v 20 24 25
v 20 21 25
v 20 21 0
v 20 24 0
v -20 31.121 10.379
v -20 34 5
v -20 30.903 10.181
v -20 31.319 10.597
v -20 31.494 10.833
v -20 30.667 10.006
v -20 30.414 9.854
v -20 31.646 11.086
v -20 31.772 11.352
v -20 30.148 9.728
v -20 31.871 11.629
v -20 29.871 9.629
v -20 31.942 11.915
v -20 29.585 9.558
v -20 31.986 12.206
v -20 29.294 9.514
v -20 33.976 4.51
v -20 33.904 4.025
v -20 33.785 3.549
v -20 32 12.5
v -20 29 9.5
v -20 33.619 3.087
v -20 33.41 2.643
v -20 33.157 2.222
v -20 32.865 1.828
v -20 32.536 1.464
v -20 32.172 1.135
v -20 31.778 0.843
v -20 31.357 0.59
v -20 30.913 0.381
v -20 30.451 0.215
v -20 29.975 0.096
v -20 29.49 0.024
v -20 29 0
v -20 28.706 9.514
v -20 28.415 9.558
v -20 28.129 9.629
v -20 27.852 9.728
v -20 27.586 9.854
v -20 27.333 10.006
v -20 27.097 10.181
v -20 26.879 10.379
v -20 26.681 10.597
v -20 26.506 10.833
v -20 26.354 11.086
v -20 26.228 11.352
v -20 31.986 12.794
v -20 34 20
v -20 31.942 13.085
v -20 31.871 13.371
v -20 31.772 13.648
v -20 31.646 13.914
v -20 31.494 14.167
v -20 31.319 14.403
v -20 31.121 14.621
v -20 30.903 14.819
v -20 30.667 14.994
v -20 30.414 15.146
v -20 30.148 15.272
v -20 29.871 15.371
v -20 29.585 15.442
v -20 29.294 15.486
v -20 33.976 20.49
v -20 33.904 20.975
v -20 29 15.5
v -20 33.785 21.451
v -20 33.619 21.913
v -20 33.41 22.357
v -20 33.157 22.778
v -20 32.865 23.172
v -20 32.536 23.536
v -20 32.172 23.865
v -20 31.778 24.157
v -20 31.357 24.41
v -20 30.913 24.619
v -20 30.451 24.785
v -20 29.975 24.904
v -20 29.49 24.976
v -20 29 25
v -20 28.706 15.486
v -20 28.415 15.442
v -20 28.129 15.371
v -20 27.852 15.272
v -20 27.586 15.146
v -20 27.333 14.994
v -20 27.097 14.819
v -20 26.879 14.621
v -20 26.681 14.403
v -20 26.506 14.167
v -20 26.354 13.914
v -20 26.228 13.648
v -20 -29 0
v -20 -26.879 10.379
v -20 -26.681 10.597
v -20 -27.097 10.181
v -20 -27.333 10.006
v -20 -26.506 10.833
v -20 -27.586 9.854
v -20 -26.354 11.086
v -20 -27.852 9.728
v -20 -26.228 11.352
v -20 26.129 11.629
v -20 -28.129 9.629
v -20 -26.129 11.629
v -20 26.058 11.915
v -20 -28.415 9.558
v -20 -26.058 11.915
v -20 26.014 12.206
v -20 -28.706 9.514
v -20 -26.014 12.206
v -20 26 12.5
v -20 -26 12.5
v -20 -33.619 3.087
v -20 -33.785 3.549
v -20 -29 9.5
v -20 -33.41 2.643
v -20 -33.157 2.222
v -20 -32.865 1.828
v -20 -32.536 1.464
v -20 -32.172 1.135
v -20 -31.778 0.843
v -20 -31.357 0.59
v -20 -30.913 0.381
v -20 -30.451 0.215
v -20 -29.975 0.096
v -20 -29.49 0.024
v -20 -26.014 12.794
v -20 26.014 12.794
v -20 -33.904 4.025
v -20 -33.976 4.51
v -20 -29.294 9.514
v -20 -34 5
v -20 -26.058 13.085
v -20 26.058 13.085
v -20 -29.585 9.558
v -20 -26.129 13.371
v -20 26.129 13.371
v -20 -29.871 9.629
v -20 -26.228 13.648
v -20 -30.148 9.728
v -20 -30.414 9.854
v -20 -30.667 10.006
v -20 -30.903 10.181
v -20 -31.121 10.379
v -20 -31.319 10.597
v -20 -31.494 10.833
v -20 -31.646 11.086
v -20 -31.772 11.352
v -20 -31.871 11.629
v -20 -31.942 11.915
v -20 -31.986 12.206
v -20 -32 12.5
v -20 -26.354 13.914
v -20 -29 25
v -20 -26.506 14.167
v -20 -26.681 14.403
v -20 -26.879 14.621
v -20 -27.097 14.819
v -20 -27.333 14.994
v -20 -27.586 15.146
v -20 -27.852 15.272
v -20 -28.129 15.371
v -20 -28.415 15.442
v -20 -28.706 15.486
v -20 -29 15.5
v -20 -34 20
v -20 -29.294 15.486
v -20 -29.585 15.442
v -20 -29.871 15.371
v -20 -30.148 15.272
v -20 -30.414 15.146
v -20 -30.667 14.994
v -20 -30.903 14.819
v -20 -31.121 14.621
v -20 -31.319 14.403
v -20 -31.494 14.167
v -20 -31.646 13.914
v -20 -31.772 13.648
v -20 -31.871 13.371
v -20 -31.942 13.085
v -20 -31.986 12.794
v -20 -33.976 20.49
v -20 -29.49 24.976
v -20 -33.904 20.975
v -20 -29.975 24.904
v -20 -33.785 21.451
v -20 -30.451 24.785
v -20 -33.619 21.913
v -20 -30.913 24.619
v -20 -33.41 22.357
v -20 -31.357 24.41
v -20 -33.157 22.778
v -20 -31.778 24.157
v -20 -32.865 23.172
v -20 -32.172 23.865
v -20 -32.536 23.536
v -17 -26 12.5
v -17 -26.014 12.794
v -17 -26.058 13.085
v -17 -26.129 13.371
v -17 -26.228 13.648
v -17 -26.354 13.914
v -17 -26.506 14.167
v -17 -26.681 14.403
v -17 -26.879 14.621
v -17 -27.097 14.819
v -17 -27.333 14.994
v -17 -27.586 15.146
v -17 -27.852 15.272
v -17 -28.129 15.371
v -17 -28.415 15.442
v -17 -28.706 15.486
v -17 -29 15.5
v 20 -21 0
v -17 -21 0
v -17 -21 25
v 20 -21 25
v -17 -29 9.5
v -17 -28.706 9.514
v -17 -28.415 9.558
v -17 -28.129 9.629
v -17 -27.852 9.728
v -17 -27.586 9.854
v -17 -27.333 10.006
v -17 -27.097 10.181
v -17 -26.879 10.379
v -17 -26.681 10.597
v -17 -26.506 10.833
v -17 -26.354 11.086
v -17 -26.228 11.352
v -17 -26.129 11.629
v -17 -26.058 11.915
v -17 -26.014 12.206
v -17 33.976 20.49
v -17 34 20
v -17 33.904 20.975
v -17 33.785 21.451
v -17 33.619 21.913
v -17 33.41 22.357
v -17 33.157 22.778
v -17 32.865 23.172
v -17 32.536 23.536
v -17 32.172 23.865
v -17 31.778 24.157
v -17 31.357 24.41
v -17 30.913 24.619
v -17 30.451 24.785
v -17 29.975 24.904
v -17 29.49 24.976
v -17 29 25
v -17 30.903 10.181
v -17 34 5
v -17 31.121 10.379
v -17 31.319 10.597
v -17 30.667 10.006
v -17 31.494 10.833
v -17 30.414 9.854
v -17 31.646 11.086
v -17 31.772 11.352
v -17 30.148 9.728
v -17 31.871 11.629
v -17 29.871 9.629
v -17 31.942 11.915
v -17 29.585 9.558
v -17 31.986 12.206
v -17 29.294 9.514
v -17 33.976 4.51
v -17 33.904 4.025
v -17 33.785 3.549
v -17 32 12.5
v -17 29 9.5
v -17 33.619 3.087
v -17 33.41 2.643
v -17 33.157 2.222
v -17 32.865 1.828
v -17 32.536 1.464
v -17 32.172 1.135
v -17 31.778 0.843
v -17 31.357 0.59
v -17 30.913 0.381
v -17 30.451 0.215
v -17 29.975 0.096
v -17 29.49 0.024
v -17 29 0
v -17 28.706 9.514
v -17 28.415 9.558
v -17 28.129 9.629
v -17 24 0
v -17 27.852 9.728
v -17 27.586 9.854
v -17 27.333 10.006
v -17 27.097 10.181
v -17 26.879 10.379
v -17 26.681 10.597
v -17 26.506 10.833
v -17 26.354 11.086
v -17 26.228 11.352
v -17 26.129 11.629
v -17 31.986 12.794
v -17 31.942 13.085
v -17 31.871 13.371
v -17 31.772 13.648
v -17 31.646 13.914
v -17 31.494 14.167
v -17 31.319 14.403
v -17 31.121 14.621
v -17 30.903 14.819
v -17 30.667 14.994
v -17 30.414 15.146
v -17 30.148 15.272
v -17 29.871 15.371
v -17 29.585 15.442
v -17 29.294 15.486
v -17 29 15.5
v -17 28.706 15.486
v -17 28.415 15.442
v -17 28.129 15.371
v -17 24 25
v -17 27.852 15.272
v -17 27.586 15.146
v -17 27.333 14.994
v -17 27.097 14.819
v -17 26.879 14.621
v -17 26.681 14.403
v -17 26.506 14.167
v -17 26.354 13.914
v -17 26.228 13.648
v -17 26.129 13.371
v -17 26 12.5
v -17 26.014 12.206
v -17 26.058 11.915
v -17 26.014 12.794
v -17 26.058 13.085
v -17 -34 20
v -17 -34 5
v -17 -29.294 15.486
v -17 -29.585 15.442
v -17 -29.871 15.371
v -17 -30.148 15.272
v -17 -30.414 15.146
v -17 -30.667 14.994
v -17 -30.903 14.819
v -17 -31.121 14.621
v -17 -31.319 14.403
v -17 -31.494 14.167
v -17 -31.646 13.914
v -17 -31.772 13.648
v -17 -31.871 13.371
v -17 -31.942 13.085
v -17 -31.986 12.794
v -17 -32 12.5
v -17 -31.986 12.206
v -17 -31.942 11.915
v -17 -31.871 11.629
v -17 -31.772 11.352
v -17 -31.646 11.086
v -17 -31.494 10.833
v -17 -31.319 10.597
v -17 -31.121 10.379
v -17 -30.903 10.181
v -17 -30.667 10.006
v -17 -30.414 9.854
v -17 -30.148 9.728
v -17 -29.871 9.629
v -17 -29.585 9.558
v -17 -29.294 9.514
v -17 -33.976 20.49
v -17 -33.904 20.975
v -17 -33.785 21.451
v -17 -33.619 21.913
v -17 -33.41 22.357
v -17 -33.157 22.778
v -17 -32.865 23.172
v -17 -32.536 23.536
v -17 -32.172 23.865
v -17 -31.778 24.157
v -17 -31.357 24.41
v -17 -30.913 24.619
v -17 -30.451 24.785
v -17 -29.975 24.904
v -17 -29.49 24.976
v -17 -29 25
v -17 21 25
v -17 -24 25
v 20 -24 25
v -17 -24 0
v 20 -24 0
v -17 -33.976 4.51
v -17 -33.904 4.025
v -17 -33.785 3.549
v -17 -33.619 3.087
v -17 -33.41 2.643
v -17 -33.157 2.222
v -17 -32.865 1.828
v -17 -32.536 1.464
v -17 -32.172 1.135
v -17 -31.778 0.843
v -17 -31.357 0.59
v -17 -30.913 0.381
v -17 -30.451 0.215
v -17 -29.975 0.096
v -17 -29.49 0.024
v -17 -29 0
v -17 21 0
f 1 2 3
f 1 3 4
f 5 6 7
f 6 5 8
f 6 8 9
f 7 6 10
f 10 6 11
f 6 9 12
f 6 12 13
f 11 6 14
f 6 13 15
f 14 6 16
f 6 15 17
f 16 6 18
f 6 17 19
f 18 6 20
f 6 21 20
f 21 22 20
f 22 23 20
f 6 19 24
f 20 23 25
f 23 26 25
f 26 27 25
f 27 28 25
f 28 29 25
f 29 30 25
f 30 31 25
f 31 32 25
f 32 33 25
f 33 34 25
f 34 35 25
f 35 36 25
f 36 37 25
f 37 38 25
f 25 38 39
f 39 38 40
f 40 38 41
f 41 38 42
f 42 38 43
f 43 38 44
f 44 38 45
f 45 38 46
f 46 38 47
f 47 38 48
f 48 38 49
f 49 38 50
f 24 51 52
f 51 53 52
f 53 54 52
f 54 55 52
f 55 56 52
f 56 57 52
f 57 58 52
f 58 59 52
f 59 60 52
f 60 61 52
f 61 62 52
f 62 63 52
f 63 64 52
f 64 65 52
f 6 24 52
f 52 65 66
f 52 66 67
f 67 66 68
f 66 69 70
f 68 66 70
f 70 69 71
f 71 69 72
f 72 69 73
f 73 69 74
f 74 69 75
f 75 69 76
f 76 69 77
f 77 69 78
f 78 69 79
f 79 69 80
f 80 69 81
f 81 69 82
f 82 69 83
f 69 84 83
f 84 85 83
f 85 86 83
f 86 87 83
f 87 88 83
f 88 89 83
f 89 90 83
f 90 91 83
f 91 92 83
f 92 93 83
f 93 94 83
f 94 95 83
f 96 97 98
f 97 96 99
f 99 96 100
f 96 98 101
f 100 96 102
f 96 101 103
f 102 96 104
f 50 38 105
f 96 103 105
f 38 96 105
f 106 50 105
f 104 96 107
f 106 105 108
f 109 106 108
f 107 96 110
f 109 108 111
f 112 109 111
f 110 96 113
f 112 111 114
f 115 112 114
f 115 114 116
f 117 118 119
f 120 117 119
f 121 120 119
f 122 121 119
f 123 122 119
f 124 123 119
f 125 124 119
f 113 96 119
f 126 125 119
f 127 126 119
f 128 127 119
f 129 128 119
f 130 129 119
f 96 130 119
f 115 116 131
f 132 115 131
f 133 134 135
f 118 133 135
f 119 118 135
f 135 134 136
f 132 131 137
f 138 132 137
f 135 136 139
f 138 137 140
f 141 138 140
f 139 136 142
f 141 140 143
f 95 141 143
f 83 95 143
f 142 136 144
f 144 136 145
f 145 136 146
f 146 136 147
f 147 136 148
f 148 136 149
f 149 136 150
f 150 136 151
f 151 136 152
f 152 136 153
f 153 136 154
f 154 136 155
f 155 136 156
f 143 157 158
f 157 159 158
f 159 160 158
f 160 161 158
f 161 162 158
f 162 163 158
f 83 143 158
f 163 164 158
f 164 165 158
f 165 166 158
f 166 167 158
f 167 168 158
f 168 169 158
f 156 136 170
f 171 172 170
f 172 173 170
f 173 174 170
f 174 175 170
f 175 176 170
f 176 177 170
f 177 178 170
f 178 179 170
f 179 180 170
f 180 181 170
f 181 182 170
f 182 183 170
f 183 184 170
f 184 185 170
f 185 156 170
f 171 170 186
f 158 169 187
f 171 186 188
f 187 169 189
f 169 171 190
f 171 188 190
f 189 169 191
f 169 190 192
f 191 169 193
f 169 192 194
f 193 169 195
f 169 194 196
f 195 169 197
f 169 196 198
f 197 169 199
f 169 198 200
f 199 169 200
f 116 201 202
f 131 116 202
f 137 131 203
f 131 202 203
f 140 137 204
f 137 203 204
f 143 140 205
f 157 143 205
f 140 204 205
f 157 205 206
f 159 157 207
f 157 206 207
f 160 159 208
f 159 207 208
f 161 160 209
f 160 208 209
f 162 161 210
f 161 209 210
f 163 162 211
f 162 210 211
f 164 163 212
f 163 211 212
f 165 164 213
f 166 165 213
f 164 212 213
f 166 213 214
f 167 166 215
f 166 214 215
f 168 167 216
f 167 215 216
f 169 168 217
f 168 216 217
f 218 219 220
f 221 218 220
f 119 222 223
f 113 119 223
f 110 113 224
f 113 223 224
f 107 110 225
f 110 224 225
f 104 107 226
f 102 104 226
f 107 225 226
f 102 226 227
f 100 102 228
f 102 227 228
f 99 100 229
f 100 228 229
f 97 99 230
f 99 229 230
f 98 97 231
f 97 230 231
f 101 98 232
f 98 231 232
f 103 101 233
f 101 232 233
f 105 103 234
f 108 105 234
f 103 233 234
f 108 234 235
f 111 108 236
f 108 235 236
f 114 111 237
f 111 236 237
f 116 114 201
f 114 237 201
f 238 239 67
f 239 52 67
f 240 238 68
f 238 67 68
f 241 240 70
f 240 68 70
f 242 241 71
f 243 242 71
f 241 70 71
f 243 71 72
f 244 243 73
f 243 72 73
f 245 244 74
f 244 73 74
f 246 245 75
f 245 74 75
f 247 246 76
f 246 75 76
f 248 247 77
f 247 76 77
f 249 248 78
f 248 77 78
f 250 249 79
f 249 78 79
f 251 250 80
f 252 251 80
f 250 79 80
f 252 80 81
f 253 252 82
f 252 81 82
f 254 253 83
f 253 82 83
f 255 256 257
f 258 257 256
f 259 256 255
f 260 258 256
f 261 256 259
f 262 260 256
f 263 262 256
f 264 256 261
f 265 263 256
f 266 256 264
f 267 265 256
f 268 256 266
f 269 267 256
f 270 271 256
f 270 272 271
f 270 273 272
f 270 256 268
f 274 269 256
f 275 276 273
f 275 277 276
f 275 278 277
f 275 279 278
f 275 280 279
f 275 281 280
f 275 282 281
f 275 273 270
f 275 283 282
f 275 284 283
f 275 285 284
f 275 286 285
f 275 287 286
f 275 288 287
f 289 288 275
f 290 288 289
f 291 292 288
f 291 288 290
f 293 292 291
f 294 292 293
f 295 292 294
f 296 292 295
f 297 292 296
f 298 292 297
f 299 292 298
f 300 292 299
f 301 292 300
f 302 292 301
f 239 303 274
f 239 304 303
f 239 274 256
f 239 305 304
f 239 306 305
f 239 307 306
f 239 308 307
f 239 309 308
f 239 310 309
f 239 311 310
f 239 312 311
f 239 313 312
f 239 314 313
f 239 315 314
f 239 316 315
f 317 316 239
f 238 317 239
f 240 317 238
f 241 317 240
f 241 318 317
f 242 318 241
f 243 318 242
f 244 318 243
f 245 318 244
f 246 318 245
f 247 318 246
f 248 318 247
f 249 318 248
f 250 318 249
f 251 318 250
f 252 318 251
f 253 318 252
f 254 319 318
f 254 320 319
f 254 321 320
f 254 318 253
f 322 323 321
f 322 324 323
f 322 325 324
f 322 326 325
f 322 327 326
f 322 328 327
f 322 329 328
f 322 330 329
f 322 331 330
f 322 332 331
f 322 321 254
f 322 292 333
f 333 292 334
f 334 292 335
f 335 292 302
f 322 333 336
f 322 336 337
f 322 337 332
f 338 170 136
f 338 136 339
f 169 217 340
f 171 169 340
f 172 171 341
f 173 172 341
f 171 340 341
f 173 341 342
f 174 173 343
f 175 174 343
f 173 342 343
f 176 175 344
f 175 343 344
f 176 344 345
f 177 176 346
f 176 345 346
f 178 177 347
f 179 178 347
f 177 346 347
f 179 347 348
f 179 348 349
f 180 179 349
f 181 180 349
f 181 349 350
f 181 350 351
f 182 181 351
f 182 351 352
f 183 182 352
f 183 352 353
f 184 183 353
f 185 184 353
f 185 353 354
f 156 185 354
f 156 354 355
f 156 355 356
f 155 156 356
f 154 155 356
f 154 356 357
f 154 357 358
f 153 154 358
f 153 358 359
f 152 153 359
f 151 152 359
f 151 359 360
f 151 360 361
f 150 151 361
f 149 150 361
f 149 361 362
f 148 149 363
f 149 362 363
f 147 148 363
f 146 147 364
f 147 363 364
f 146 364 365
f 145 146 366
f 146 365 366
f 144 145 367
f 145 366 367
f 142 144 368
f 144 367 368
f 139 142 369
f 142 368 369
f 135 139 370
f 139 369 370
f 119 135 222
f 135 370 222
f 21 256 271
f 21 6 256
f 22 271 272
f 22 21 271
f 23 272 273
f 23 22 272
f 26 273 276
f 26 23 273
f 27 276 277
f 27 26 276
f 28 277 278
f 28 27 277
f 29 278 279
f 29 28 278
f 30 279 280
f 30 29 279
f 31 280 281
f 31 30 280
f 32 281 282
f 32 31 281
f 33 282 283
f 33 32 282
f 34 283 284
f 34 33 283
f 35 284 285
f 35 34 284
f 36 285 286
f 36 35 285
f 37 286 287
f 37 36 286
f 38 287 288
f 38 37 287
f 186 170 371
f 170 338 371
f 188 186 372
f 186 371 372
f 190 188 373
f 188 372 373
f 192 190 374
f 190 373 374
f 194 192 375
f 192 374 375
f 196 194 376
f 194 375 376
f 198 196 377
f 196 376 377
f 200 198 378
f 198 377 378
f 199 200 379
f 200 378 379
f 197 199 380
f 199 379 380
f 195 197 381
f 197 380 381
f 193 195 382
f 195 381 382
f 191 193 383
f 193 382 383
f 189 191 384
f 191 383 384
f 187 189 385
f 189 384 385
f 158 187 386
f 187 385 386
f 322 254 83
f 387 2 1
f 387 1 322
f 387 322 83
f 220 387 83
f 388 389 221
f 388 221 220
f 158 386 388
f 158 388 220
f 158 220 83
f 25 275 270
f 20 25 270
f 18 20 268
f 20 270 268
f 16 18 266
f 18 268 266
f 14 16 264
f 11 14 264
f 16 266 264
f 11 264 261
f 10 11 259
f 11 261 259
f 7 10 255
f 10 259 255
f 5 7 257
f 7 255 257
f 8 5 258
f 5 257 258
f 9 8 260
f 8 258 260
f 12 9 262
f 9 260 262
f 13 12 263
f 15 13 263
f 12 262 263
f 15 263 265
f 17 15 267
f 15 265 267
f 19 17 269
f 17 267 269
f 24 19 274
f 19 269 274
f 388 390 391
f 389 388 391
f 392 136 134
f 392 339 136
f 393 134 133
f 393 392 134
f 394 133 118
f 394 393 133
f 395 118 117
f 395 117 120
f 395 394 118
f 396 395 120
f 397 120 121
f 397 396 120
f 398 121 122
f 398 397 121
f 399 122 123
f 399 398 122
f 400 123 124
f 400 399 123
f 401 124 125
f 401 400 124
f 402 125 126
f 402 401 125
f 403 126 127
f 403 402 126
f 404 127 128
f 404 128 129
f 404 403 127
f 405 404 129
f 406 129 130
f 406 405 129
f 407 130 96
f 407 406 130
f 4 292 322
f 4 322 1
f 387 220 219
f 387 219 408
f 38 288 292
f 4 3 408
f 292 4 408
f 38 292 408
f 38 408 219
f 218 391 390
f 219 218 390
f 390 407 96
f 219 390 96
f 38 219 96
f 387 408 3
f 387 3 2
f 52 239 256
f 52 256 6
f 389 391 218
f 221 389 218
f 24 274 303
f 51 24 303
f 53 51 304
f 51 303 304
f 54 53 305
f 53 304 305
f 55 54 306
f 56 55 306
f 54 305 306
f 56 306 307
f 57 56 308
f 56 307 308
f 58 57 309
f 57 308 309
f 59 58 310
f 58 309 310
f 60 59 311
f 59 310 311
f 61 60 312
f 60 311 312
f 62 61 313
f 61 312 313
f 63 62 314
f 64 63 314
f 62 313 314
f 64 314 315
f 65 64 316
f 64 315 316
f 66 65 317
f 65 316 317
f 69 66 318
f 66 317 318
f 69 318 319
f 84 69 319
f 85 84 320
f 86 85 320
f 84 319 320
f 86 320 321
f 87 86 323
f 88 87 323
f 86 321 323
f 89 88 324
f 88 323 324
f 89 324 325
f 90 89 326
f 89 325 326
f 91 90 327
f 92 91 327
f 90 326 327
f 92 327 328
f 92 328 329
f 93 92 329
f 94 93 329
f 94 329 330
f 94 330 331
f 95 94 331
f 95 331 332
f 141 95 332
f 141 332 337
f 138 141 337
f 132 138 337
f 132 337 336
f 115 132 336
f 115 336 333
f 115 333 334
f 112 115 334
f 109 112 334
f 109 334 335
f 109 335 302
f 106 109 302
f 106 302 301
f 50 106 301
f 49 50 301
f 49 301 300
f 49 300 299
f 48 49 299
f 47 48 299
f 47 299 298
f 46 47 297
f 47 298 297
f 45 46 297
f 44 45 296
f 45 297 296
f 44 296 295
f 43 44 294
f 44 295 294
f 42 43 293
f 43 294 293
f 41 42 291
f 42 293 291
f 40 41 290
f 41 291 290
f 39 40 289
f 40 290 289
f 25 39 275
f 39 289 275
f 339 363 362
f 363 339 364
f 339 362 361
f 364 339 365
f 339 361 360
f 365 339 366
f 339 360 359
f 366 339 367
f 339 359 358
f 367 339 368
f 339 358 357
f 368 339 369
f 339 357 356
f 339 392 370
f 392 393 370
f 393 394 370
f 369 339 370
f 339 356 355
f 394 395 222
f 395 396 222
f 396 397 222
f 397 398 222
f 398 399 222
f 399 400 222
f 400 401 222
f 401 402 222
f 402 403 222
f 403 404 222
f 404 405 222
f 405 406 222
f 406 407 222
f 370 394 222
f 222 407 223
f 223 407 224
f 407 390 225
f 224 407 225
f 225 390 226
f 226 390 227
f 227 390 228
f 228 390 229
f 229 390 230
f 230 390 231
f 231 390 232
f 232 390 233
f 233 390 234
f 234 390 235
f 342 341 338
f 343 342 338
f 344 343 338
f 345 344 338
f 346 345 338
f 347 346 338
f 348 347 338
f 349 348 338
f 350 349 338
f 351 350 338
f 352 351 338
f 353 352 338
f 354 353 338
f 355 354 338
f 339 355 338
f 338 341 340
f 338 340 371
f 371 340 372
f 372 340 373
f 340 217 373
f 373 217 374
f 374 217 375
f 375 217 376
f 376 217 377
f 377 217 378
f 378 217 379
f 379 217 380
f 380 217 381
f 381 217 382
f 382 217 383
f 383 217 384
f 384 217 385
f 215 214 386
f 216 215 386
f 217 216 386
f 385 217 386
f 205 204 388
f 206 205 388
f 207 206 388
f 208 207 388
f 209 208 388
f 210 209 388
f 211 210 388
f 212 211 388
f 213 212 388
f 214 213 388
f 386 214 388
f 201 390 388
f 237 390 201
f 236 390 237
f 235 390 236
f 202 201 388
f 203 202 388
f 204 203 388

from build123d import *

# Parameters (mm, degrees)
F0_W      = 40
F0_H      = 48
F1_DEPTH  = 25
F3_W      = 42
F3_H      = 25
F4_DEPTH  = 37
F2_W      = 3
F2_H      = 25
F5_DEPTH  = 10
F6_W      = 3
F6_H      = 25
F7_DEPTH  = 10
F8_R      = 5
F11_DEPTH = 25


with BuildPart() as f1:
    # F0 (on Top) → F1 (new body)
    with BuildSketch(Plane.XY):
        Rectangle(F0_W, F0_H)
    extrude(amount=F1_DEPTH)

    # F3 (on face) → F4 (cut)
    with BuildSketch(Plane.YZ.offset(20)):
        with Locations((0, 12.5)):
            Rectangle(F3_W, F3_H)
    extrude(amount=-F4_DEPTH, mode=Mode.SUBTRACT)

    # F2 (on face) → F5 (join)
    with BuildSketch(Plane.XZ.offset(24)):
        with Locations((-18.5, 12.5)):
            Rectangle(F2_W, F2_H)
    extrude(amount=F5_DEPTH)

    # F6 (on face) → F7 (join)
    with BuildSketch(Plane(origin=(0, 24, 0), x_dir=(-1, 0, 0), z_dir=(0, 1, 0))):
        with Locations((18.5, 12.5)):
            Rectangle(F6_W, F6_H)
    extrude(amount=F7_DEPTH)

    # F8
    f8_edges = [f1.edges().sort_by_distance(p)[0] for p in [
        (-18.5, 34, 0),
        (-18.5, 34, 25),
        (-18.5, -34, 0),
        (-18.5, -34, 25),
    ]]
    fillet(f8_edges, radius=F8_R)

    # F10 (on face) + F9 (on face) → F11 (cut)
    with BuildSketch(Plane.YZ.offset(-17)):
        with BuildLine():
            ThreePointArc((29, 15.5), (26, 12.5), (29, 9.5))
            Line((29, 9.5), (29, 15.5))
        make_face()
        with BuildLine():
            Line((29, 15.5), (29, 9.5))
            ThreePointArc((29, 9.5), (31.1213203436, 10.3786796564), (32, 12.5))
            ThreePointArc((32, 12.5), (31.1213203436, 14.6213203436), (29, 15.5))
        make_face()
    with BuildSketch(Plane.YZ.offset(-17)):
        with BuildLine():
            ThreePointArc((-29, 15.5), (-32, 12.5), (-29, 9.5))
            Line((-29, 9.5), (-29, 15.5))
        make_face()
        with BuildLine():
            Line((-29, 15.5), (-29, 9.5))
            ThreePointArc((-29, 9.5), (-26.8786796564, 10.3786796564), (-26, 12.5))
            ThreePointArc((-26, 12.5), (-26.8786796564, 14.6213203436), (-29, 15.5))
        make_face()
    extrude(amount=-F11_DEPTH, mode=Mode.SUBTRACT)


solid = f1.part
